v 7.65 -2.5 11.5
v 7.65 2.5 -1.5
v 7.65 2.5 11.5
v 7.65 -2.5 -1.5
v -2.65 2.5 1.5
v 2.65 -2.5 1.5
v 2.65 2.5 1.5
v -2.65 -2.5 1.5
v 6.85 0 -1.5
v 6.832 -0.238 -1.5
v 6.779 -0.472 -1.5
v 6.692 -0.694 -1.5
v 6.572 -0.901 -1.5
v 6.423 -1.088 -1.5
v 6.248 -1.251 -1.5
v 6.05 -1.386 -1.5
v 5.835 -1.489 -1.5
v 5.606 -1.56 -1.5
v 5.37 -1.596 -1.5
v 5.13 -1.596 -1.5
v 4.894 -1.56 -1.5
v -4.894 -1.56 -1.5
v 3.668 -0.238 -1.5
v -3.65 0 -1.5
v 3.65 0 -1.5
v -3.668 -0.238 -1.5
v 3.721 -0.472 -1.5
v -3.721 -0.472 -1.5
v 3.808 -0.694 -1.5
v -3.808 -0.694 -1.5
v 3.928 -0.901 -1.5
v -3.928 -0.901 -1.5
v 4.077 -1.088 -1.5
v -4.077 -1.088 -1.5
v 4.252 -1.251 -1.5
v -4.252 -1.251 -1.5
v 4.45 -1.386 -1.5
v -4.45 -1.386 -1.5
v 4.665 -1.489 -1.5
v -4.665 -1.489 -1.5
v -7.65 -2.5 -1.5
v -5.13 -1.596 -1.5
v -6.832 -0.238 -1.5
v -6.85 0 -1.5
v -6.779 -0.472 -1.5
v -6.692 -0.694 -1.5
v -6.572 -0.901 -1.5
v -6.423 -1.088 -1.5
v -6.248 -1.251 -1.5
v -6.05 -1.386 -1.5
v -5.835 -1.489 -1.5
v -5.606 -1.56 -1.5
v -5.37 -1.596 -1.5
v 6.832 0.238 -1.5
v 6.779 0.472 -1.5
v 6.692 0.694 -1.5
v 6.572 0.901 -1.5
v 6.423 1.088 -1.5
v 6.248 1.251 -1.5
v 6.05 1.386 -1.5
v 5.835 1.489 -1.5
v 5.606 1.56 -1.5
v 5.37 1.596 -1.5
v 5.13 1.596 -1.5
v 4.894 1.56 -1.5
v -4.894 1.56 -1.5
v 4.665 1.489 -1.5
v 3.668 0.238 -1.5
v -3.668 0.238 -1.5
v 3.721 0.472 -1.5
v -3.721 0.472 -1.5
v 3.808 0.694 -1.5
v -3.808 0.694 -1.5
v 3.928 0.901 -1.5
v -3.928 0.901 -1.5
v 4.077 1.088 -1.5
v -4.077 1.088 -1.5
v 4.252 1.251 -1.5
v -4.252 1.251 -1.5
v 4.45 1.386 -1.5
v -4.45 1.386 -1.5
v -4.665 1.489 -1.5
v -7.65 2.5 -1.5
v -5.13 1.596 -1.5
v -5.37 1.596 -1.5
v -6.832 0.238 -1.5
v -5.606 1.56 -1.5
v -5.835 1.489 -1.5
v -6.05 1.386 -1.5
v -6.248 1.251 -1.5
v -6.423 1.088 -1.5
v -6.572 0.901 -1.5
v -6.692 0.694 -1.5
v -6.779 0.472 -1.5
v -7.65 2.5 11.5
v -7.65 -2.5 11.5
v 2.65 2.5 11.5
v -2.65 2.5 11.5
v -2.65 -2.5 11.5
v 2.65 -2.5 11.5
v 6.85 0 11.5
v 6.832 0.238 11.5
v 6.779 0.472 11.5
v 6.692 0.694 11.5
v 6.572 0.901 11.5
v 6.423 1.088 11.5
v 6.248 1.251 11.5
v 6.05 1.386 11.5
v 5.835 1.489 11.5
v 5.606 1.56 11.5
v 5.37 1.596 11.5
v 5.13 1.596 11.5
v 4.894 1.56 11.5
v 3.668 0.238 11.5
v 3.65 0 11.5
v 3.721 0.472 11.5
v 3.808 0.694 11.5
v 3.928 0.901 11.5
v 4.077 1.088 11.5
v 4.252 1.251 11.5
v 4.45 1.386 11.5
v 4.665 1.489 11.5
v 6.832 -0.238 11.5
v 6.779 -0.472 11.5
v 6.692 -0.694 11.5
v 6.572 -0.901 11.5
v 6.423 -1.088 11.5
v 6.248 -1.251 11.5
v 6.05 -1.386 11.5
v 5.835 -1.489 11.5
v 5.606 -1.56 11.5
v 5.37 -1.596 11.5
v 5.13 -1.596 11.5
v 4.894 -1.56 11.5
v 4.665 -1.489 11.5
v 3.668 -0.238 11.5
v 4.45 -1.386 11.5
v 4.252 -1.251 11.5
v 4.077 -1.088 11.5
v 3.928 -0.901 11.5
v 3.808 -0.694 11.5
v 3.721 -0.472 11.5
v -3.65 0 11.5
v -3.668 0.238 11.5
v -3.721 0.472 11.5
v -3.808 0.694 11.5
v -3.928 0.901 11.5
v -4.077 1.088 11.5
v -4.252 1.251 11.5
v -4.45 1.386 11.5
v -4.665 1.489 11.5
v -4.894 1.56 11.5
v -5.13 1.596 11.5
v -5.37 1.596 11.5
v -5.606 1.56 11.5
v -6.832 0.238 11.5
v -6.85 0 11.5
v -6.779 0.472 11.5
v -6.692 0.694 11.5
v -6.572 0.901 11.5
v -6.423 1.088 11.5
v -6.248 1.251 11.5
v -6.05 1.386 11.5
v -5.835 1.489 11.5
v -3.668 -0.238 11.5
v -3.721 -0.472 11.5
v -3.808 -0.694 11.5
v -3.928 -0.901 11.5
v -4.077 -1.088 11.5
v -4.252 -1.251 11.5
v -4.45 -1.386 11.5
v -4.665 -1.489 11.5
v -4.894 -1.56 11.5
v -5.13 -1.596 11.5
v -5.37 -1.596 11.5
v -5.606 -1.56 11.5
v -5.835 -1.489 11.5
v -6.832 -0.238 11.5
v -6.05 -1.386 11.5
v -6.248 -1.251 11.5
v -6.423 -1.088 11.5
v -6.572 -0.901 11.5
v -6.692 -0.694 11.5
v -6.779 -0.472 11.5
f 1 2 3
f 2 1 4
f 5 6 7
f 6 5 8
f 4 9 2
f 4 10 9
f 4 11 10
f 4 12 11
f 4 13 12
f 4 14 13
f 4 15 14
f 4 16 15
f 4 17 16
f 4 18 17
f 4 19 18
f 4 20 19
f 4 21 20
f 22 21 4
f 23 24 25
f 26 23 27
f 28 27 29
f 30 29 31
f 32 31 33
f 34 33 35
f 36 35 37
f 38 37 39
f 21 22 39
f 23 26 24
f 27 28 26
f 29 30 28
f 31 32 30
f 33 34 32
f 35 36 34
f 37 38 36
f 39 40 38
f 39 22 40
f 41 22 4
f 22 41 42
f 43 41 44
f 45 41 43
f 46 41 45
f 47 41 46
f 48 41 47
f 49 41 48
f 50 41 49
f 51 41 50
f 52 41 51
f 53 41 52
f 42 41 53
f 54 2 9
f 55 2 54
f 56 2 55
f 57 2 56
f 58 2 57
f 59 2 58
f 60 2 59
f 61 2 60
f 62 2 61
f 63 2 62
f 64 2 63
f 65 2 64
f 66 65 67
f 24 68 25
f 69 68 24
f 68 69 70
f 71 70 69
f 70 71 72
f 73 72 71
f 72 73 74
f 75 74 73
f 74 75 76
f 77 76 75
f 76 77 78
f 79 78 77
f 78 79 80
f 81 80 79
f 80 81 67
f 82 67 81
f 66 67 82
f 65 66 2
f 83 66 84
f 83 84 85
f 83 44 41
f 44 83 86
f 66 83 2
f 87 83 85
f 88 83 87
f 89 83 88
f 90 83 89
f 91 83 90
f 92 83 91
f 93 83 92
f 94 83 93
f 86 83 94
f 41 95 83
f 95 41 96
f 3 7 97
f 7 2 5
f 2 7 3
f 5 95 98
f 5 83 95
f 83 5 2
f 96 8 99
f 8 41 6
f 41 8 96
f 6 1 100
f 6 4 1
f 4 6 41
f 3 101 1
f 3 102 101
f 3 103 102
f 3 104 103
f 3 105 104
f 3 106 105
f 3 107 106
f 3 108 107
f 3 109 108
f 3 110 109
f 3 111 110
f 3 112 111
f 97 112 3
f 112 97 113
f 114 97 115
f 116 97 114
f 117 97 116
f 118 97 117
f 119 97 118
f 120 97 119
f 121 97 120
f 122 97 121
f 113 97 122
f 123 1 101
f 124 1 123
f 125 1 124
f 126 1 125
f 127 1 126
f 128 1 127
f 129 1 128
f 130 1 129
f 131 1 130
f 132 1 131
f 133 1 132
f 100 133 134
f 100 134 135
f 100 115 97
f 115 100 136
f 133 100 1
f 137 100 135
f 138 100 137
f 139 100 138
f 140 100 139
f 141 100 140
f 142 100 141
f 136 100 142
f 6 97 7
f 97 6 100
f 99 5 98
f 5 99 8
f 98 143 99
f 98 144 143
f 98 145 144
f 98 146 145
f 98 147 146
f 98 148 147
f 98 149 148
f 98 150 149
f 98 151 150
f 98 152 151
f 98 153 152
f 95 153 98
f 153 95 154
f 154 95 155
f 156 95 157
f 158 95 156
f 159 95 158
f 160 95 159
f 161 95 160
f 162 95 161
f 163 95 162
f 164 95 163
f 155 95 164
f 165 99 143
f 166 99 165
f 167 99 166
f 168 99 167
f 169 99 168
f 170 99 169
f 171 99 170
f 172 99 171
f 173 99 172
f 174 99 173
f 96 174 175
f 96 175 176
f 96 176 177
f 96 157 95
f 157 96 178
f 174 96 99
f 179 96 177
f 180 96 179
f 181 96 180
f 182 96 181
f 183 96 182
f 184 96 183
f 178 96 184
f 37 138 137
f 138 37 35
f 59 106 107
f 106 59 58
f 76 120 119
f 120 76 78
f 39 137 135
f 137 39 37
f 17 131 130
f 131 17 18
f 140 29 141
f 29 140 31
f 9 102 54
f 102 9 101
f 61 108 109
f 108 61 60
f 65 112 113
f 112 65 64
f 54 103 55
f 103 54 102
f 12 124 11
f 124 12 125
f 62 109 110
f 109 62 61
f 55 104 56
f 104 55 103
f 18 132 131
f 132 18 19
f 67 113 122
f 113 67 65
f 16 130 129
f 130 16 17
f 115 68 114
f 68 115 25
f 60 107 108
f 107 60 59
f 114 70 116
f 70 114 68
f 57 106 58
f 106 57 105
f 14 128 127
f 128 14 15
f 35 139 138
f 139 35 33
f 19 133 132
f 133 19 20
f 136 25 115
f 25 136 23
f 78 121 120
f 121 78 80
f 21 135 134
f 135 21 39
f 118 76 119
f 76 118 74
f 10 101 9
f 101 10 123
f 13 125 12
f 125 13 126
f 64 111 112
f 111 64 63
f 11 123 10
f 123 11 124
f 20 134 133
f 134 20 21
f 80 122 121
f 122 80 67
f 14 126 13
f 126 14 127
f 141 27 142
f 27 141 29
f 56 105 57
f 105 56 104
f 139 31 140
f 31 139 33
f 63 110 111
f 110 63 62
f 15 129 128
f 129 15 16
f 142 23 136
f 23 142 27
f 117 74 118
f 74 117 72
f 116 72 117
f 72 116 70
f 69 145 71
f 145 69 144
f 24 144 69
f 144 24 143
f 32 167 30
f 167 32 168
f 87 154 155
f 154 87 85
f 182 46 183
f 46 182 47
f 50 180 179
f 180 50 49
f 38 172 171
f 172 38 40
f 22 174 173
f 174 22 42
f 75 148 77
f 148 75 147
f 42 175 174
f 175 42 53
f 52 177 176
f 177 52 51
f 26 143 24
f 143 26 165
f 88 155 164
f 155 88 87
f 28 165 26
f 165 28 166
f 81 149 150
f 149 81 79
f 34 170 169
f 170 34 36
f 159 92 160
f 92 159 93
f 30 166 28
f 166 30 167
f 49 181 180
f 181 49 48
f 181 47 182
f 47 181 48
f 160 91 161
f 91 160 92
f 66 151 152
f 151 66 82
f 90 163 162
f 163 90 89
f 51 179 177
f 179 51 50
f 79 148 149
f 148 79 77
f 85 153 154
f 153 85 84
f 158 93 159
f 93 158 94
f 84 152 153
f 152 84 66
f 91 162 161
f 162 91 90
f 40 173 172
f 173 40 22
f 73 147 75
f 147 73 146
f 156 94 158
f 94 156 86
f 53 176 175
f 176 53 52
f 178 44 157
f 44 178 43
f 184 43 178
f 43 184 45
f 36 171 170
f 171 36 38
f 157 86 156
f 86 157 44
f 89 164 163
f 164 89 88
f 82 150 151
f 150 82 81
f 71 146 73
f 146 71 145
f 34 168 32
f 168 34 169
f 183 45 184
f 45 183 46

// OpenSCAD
$fn=42;
hole_diameter = 3.2;
center_dist = 10.5;
stand_height = 10;


beam_len = center_dist + hole_diameter * 1.5;
beam_core_thickness = 3;
main_dimension = 5;

difference(){
    union(){
        cube([ beam_len, main_dimension, 3], true);
        translate([beam_len/2 - main_dimension, -main_dimension/2, beam_core_thickness/2])
            cube([main_dimension,main_dimension,stand_height]);
        translate([-1 * (beam_len/2), -main_dimension/2, beam_core_thickness/2])
            cube([main_dimension,main_dimension,stand_height]);
    }
    
    translate([center_dist / 2, 0, 0])
        cylinder(42,hole_diameter/2, hole_diameter/2, center = true);
    translate([-1*center_dist / 2, 0, 0])
        cylinder(42,hole_diameter/2, hole_diameter/2, center = true);
}
